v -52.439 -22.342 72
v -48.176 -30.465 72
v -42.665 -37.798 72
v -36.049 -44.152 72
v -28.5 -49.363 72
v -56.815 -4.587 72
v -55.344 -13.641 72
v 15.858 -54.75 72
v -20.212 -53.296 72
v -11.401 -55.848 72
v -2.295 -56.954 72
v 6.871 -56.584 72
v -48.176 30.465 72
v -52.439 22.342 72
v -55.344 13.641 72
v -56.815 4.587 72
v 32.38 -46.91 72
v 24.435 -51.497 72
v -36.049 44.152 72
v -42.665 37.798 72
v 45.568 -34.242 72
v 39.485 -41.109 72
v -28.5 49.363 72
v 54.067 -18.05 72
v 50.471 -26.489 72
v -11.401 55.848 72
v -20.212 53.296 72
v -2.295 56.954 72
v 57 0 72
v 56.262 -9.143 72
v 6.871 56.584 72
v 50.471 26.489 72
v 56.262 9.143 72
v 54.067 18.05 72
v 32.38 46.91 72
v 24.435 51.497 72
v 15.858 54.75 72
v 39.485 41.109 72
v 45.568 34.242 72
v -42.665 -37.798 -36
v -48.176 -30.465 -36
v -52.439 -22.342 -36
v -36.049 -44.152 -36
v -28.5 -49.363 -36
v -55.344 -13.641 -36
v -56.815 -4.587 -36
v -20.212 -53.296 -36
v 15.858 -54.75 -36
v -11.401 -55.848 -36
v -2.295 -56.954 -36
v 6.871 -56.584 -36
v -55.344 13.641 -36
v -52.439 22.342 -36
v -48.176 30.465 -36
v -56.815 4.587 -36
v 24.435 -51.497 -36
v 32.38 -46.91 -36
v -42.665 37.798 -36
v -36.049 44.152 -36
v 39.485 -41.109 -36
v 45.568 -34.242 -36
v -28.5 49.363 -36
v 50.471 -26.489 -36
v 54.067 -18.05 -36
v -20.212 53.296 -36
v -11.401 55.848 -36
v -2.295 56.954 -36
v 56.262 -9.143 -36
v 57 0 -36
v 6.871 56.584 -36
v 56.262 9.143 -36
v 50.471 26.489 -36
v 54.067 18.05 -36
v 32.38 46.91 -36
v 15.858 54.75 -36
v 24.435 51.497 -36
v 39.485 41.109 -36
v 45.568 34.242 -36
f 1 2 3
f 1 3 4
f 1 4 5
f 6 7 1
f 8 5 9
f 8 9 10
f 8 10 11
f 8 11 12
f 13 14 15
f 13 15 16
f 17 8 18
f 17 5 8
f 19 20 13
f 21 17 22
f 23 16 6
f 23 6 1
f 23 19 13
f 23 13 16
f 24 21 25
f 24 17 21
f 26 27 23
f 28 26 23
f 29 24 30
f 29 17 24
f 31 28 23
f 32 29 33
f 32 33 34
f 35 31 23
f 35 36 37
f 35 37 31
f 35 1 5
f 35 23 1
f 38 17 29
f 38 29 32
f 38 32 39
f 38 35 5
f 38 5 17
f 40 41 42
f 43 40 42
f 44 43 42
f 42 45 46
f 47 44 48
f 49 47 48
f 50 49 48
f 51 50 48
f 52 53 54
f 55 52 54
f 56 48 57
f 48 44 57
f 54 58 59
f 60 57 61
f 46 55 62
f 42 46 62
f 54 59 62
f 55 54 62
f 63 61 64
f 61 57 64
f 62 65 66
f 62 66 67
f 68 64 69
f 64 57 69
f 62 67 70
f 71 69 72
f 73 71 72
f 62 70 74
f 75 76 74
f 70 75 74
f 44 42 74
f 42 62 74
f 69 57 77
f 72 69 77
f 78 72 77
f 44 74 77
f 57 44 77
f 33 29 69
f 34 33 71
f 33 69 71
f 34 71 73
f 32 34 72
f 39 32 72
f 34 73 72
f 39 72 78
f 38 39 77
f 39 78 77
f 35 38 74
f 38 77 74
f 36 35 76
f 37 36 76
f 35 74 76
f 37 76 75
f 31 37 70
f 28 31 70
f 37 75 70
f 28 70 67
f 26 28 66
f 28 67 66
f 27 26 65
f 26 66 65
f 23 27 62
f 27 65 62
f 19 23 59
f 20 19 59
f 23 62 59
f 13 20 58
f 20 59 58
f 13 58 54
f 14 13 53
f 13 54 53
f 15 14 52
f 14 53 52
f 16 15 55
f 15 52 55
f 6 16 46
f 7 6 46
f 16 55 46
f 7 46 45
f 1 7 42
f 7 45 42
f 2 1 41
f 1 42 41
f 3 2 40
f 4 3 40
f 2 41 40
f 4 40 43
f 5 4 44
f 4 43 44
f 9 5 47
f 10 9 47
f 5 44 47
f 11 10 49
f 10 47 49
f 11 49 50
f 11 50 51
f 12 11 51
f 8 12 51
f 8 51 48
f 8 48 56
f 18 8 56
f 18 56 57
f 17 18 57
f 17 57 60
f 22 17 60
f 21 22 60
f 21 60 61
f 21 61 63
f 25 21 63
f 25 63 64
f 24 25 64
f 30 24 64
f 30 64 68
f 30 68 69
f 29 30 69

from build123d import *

# Parameters (mm, degrees)
SKETCH1_R          = 19
BASE_EXTRUDE_DEPTH = 36
SCALE1_SCALE       = 2.5
SCALE2_SCALE       = 1.2


with BuildPart() as part:
    # Sketch1 → Base-Extrude (new body)
    with BuildSketch(Plane.XY):
        Circle(SKETCH1_R)
    extrude(amount=BASE_EXTRUDE_DEPTH)


with BuildPart() as part_1:
    # Scale1: scaled about (0, 0, 18)
    add(part.part.scale(SCALE1_SCALE).moved(Location((0, 0, -27))))


with BuildPart() as part_2:
    # Scale2: scaled about (0, 0, 18)
    add(part_1.part.scale(SCALE2_SCALE).moved(Location((0, 0, -3.6))))


solid = part_2.part
